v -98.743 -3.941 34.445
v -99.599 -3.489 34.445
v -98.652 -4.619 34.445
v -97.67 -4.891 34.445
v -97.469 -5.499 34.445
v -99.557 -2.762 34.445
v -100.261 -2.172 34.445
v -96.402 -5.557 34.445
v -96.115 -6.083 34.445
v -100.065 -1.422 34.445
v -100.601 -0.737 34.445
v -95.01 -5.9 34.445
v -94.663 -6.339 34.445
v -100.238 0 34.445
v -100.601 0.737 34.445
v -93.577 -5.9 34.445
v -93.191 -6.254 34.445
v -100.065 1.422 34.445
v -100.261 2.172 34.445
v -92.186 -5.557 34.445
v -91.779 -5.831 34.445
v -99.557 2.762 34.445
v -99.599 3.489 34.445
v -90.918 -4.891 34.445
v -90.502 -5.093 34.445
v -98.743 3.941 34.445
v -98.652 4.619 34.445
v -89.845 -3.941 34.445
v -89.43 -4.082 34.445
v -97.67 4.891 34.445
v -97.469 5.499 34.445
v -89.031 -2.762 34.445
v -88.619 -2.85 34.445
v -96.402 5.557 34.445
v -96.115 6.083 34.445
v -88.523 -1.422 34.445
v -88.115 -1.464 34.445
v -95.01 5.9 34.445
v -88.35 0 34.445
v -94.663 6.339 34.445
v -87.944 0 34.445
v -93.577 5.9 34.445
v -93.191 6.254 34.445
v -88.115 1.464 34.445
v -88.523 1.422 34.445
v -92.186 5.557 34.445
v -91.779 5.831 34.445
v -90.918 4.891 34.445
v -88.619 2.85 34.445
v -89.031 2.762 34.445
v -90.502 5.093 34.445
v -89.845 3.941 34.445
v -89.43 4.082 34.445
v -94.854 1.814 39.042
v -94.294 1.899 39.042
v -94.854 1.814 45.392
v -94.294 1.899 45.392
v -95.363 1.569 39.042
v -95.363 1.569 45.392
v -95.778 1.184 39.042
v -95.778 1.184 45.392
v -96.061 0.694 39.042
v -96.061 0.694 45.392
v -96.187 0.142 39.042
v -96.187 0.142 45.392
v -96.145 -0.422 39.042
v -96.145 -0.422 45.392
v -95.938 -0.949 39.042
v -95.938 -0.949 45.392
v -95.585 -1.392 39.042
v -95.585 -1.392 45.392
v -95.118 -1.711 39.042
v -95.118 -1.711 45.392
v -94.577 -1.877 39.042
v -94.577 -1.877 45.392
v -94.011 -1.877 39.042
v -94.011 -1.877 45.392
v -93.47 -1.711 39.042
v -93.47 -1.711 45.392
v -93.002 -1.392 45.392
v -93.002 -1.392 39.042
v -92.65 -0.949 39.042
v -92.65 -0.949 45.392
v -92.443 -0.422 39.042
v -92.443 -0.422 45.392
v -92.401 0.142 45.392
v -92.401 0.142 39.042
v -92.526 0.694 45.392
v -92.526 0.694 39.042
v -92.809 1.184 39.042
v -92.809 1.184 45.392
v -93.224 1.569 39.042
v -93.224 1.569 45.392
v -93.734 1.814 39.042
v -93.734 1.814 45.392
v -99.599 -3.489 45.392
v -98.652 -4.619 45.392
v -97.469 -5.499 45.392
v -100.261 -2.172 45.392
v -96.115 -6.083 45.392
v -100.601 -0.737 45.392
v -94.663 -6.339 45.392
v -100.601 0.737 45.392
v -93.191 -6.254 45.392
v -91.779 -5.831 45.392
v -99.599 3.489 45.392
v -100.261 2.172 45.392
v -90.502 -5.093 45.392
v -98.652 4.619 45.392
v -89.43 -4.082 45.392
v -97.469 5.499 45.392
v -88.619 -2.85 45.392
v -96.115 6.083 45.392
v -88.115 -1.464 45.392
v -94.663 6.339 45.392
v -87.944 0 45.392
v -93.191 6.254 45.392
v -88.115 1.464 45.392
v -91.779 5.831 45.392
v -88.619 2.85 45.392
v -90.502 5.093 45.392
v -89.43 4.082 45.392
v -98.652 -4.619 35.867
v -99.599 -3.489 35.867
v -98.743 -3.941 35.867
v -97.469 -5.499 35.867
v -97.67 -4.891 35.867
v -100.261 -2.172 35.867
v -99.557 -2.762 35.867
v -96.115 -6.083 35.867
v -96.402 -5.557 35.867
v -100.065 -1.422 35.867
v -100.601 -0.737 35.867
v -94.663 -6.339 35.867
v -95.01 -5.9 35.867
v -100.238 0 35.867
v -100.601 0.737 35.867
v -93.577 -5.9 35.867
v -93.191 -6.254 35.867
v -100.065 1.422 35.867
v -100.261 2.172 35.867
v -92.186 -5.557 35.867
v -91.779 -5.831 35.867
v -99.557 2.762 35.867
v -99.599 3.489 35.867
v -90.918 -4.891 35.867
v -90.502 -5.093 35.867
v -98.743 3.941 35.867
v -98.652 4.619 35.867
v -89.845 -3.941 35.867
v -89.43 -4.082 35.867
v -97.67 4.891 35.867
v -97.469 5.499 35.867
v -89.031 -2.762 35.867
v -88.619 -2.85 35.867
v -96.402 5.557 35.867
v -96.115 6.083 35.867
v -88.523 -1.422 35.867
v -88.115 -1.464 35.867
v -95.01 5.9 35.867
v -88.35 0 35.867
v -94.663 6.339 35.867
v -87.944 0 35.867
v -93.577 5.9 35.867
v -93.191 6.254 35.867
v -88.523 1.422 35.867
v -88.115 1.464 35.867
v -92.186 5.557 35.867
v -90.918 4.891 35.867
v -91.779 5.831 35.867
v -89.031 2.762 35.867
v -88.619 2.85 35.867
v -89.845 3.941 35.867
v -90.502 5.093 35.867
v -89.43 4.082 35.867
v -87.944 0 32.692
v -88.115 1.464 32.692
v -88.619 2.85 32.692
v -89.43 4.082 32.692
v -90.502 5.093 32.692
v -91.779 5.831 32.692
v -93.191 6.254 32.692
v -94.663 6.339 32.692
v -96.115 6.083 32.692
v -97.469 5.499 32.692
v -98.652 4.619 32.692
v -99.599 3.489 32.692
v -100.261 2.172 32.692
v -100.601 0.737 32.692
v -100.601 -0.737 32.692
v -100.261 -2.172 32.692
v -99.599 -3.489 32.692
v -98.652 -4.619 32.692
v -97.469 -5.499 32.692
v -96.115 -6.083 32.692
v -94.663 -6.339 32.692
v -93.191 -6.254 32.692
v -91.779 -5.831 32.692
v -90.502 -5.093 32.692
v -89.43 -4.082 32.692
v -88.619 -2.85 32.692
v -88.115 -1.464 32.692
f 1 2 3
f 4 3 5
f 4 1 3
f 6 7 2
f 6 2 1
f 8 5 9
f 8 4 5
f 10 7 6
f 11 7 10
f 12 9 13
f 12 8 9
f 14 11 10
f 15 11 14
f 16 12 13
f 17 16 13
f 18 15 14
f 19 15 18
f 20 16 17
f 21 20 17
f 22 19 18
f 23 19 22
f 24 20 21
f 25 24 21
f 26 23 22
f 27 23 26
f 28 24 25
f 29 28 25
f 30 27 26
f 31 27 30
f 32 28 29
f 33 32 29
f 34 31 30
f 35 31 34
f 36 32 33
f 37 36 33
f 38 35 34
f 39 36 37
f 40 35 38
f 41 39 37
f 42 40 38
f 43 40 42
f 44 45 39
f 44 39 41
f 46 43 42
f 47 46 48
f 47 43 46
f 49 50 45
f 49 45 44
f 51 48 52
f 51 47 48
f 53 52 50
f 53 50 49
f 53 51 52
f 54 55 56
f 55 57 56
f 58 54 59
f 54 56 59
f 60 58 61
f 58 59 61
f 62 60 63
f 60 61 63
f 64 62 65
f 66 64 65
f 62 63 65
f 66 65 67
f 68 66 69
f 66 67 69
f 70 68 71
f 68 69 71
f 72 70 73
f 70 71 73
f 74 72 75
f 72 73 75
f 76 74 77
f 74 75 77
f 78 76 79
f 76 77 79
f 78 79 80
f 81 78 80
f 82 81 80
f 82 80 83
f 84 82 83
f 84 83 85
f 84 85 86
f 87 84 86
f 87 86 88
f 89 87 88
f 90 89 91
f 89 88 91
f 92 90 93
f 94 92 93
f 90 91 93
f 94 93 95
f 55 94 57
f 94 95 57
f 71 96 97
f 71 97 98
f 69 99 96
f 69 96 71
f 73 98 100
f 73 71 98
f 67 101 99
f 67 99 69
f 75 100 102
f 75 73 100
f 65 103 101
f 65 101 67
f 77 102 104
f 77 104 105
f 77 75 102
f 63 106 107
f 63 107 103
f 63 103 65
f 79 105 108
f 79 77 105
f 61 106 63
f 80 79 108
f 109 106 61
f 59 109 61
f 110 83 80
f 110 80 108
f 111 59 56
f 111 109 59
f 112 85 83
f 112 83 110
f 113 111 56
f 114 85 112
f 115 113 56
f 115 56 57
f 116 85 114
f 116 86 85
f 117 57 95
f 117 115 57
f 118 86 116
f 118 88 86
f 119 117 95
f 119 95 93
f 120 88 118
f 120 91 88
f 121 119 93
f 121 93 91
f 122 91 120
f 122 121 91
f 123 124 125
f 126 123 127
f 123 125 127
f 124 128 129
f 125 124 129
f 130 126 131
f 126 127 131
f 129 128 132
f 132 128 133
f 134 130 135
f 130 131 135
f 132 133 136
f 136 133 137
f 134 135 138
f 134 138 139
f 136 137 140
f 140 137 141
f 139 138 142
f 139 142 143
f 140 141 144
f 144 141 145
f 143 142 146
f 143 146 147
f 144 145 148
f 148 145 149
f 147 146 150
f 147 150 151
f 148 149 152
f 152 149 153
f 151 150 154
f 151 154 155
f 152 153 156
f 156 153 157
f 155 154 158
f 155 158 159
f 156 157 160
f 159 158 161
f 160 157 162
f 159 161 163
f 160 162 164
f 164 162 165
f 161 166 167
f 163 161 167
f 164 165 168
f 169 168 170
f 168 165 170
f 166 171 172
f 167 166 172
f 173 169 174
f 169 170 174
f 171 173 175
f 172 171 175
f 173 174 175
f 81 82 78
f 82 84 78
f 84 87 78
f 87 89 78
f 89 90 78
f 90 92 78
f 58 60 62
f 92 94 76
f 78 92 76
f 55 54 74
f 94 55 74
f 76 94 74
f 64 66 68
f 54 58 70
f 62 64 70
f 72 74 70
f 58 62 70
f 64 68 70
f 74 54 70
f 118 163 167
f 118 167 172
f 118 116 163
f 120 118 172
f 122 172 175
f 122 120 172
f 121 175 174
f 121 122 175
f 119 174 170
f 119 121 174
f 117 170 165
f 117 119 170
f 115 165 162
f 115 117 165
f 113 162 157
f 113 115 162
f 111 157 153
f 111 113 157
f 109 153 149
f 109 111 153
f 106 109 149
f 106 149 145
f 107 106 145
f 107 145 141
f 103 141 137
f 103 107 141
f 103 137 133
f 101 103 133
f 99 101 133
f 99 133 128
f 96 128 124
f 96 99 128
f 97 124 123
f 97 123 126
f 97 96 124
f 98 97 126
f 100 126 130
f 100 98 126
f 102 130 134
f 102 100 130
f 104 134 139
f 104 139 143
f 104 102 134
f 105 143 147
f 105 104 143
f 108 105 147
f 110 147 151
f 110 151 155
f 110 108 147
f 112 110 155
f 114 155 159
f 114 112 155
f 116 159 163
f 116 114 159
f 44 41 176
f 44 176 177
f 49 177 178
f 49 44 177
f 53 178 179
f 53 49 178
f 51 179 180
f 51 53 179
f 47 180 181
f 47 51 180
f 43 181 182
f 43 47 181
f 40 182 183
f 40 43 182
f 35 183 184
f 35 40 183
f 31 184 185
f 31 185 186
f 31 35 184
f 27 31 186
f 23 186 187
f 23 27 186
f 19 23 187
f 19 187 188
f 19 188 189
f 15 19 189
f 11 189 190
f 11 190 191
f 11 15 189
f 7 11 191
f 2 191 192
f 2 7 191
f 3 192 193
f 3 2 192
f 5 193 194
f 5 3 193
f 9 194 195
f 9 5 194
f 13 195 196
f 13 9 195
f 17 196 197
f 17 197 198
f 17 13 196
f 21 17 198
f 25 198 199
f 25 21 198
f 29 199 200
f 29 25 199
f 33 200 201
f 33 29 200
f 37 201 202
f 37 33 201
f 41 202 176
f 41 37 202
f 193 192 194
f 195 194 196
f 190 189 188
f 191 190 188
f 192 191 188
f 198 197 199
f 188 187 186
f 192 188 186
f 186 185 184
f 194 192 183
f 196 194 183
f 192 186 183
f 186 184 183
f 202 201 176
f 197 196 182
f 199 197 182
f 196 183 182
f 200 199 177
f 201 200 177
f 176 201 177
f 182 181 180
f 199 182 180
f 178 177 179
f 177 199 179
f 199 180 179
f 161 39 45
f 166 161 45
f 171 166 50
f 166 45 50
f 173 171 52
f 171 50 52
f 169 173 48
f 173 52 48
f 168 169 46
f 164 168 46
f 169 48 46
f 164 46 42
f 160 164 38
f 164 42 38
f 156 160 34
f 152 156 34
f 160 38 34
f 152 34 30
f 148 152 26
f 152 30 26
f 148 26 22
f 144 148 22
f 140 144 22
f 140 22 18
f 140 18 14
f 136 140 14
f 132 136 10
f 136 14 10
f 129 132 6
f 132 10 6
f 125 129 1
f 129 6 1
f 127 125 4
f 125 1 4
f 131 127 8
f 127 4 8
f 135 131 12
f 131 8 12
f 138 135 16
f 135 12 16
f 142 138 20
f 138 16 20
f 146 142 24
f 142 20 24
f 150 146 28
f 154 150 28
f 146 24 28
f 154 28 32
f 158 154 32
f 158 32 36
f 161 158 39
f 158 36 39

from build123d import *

# Parameters (mm, degrees)
SKETCH4_R                = 6.35
BOSS_EXTRUDE1_DEPTH      = 6.35
BOSS_EXTRUDE1_DEPTH_BACK = 6.35
SKETCH5_R                = 6.35
SKETCH5_R_2              = 5.9436
CUT_EXTRUDE1_DEPTH       = 1.4224
SKETCH7_W                = 1.89865
SKETCH7_H                = 6.35


with BuildPart() as part:
    # Sketch4 → Boss-Extrude1 (new body, two sides)
    with BuildSketch(Plane.XY.offset(39.04234)) as boss_extrude1_sk:
        with Locations((-94.293901082, 0)):
            Circle(SKETCH4_R)
    extrude(amount=BOSS_EXTRUDE1_DEPTH)
    extrude(boss_extrude1_sk.sketch, amount=-BOSS_EXTRUDE1_DEPTH_BACK)

    # Sketch5 → Cut-Extrude1 (cut)
    with BuildSketch(Plane.XY.offset(34.44494)):
        with Locations((-94.293901082, 0)):
            Circle(SKETCH5_R)
        with Locations((-94.293901082, 0)):
            Circle(SKETCH5_R_2, mode=Mode.SUBTRACT)
    extrude(amount=CUT_EXTRUDE1_DEPTH, mode=Mode.SUBTRACT)

    # Sketch7 → Tap Drill for _10-24 Tap1 (revolve, cut)
    with BuildSketch(Plane(origin=(-94.293901082, 0, 39.04234), x_dir=(0, 1, 0), z_dir=(1, 0, 0))):
        with Locations((0.949325, 3.175)):
            Rectangle(SKETCH7_W, SKETCH7_H)
    revolve(axis=Axis((-94.293901082, 0, 32.69234), (0, 0, 1)), mode=Mode.SUBTRACT)


solid = part.part
